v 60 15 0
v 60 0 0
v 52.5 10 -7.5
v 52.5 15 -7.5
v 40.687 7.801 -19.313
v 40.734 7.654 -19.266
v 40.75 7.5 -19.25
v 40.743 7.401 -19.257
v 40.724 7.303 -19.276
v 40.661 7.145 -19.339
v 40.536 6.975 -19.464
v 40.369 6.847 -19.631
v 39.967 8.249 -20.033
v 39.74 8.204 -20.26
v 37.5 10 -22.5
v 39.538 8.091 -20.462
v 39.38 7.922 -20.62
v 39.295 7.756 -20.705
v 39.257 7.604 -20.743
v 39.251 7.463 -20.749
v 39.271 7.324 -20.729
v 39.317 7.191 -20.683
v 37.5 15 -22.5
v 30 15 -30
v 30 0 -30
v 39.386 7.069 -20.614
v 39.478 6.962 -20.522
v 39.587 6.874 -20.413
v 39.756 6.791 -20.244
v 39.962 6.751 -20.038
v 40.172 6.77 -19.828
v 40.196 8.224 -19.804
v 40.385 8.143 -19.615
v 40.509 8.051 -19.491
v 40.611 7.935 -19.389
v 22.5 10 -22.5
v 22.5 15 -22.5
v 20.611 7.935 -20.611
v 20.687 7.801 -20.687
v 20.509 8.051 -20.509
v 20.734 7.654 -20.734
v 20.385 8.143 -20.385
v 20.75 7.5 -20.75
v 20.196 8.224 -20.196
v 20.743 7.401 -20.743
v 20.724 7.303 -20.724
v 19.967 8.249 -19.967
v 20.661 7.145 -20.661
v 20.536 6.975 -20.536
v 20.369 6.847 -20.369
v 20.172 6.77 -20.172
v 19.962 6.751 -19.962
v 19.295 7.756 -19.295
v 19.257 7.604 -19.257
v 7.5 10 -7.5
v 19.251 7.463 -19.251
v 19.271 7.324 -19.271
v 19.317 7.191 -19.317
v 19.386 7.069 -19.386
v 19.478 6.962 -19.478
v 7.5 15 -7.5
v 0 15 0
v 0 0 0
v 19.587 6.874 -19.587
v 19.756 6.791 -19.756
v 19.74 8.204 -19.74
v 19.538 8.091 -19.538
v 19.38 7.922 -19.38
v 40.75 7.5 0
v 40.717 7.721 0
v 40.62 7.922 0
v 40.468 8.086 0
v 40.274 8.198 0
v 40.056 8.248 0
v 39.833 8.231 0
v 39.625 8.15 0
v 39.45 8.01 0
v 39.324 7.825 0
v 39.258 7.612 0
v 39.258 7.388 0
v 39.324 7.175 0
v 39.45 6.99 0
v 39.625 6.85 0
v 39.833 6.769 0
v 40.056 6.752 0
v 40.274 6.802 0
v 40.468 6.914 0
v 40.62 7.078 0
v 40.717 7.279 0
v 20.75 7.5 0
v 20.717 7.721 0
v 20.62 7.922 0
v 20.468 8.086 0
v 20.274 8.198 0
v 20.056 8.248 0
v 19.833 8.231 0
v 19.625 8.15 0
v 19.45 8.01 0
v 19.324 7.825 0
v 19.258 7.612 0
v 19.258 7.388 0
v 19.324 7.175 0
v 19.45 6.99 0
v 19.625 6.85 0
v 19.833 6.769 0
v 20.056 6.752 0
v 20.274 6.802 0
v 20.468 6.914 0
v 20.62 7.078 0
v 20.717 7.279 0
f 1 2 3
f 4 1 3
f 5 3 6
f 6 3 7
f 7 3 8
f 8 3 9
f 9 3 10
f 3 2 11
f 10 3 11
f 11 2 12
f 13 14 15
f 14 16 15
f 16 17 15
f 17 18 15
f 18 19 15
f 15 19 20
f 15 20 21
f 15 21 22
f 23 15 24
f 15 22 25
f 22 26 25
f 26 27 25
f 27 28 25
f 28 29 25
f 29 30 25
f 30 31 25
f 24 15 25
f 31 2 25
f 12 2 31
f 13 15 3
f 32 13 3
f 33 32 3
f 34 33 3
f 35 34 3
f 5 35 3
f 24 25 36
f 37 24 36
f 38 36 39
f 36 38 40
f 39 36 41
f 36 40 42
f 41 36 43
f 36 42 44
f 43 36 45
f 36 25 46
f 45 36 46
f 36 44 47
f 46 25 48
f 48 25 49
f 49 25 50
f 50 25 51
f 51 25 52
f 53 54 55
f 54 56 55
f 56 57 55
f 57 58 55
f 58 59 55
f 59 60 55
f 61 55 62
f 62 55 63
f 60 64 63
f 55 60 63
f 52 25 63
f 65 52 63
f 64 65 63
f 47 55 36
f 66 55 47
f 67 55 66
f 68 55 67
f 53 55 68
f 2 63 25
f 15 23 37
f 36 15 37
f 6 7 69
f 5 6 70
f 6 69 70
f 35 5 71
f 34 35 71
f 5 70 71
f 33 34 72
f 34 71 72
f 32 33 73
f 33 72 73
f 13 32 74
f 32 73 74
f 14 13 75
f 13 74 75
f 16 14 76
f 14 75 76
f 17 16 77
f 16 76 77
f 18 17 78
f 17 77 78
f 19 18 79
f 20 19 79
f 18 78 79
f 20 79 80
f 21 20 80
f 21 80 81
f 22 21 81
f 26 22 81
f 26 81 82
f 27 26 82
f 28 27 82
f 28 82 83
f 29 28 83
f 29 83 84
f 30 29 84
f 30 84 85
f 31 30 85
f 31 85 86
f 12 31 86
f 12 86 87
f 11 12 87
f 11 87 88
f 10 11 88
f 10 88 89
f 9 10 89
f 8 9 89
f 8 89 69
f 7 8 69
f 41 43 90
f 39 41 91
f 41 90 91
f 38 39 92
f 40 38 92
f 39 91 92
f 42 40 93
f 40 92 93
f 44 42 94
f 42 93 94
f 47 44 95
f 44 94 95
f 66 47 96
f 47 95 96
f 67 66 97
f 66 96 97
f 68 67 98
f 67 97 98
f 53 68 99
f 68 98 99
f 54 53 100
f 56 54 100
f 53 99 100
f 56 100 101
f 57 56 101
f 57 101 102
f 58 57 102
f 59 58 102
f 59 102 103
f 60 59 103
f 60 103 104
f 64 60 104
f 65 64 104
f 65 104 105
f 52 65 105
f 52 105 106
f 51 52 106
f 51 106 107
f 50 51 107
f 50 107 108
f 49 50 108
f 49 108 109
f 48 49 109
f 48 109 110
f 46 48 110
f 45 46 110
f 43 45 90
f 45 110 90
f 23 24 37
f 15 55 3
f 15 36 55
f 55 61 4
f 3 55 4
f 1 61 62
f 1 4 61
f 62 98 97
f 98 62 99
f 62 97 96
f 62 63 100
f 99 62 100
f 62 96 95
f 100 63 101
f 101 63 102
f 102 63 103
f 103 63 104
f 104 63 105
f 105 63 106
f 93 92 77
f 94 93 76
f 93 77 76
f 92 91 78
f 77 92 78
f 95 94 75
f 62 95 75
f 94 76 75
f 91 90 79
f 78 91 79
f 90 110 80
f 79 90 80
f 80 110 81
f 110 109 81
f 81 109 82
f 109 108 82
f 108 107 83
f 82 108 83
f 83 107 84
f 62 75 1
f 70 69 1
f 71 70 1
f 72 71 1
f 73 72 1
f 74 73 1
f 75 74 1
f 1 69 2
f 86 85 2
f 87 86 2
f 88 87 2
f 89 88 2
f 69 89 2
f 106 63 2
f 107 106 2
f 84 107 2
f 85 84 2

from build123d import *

# Parameters (mm, degrees)
BOSS_EXTRUDE1_DEPTH = 15
CUT_EXTRUDE1_DEPTH  = 5
SKETCH4_R           = 0.75
CUT_EXTRUDE2_DEPTH  = 22.5


with BuildPart() as part:
    # Sketch1 → Boss-Extrude1 (new body)
    with BuildSketch(Plane(origin=(0, 0, 0), x_dir=(1, 0, 0), z_dir=(0, 1, 0))):
        Polygon((0, 0), (60, 0), (30, 30), align=None)
    extrude(amount=BOSS_EXTRUDE1_DEPTH)

    # Sketch3 → Cut-Extrude1 (cut)
    with BuildSketch(Plane(origin=(0, 15, 0), x_dir=(1, 0, 0), z_dir=(0, 1, 0))):
        Polygon((7.5, 7.5), (52.5, 7.5), (37.5, 22.5), (22.5, 22.5), align=None)
    extrude(amount=-CUT_EXTRUDE1_DEPTH, mode=Mode.SUBTRACT)

    # Sketch4 → Cut-Extrude2 (cut)
    with BuildSketch(Plane.XY):
        with Locations((20, 7.5)):
            Circle(SKETCH4_R)
        with Locations((40, 7.5)):
            Circle(SKETCH4_R)
    extrude(amount=-CUT_EXTRUDE2_DEPTH, mode=Mode.SUBTRACT)


solid = part.part
